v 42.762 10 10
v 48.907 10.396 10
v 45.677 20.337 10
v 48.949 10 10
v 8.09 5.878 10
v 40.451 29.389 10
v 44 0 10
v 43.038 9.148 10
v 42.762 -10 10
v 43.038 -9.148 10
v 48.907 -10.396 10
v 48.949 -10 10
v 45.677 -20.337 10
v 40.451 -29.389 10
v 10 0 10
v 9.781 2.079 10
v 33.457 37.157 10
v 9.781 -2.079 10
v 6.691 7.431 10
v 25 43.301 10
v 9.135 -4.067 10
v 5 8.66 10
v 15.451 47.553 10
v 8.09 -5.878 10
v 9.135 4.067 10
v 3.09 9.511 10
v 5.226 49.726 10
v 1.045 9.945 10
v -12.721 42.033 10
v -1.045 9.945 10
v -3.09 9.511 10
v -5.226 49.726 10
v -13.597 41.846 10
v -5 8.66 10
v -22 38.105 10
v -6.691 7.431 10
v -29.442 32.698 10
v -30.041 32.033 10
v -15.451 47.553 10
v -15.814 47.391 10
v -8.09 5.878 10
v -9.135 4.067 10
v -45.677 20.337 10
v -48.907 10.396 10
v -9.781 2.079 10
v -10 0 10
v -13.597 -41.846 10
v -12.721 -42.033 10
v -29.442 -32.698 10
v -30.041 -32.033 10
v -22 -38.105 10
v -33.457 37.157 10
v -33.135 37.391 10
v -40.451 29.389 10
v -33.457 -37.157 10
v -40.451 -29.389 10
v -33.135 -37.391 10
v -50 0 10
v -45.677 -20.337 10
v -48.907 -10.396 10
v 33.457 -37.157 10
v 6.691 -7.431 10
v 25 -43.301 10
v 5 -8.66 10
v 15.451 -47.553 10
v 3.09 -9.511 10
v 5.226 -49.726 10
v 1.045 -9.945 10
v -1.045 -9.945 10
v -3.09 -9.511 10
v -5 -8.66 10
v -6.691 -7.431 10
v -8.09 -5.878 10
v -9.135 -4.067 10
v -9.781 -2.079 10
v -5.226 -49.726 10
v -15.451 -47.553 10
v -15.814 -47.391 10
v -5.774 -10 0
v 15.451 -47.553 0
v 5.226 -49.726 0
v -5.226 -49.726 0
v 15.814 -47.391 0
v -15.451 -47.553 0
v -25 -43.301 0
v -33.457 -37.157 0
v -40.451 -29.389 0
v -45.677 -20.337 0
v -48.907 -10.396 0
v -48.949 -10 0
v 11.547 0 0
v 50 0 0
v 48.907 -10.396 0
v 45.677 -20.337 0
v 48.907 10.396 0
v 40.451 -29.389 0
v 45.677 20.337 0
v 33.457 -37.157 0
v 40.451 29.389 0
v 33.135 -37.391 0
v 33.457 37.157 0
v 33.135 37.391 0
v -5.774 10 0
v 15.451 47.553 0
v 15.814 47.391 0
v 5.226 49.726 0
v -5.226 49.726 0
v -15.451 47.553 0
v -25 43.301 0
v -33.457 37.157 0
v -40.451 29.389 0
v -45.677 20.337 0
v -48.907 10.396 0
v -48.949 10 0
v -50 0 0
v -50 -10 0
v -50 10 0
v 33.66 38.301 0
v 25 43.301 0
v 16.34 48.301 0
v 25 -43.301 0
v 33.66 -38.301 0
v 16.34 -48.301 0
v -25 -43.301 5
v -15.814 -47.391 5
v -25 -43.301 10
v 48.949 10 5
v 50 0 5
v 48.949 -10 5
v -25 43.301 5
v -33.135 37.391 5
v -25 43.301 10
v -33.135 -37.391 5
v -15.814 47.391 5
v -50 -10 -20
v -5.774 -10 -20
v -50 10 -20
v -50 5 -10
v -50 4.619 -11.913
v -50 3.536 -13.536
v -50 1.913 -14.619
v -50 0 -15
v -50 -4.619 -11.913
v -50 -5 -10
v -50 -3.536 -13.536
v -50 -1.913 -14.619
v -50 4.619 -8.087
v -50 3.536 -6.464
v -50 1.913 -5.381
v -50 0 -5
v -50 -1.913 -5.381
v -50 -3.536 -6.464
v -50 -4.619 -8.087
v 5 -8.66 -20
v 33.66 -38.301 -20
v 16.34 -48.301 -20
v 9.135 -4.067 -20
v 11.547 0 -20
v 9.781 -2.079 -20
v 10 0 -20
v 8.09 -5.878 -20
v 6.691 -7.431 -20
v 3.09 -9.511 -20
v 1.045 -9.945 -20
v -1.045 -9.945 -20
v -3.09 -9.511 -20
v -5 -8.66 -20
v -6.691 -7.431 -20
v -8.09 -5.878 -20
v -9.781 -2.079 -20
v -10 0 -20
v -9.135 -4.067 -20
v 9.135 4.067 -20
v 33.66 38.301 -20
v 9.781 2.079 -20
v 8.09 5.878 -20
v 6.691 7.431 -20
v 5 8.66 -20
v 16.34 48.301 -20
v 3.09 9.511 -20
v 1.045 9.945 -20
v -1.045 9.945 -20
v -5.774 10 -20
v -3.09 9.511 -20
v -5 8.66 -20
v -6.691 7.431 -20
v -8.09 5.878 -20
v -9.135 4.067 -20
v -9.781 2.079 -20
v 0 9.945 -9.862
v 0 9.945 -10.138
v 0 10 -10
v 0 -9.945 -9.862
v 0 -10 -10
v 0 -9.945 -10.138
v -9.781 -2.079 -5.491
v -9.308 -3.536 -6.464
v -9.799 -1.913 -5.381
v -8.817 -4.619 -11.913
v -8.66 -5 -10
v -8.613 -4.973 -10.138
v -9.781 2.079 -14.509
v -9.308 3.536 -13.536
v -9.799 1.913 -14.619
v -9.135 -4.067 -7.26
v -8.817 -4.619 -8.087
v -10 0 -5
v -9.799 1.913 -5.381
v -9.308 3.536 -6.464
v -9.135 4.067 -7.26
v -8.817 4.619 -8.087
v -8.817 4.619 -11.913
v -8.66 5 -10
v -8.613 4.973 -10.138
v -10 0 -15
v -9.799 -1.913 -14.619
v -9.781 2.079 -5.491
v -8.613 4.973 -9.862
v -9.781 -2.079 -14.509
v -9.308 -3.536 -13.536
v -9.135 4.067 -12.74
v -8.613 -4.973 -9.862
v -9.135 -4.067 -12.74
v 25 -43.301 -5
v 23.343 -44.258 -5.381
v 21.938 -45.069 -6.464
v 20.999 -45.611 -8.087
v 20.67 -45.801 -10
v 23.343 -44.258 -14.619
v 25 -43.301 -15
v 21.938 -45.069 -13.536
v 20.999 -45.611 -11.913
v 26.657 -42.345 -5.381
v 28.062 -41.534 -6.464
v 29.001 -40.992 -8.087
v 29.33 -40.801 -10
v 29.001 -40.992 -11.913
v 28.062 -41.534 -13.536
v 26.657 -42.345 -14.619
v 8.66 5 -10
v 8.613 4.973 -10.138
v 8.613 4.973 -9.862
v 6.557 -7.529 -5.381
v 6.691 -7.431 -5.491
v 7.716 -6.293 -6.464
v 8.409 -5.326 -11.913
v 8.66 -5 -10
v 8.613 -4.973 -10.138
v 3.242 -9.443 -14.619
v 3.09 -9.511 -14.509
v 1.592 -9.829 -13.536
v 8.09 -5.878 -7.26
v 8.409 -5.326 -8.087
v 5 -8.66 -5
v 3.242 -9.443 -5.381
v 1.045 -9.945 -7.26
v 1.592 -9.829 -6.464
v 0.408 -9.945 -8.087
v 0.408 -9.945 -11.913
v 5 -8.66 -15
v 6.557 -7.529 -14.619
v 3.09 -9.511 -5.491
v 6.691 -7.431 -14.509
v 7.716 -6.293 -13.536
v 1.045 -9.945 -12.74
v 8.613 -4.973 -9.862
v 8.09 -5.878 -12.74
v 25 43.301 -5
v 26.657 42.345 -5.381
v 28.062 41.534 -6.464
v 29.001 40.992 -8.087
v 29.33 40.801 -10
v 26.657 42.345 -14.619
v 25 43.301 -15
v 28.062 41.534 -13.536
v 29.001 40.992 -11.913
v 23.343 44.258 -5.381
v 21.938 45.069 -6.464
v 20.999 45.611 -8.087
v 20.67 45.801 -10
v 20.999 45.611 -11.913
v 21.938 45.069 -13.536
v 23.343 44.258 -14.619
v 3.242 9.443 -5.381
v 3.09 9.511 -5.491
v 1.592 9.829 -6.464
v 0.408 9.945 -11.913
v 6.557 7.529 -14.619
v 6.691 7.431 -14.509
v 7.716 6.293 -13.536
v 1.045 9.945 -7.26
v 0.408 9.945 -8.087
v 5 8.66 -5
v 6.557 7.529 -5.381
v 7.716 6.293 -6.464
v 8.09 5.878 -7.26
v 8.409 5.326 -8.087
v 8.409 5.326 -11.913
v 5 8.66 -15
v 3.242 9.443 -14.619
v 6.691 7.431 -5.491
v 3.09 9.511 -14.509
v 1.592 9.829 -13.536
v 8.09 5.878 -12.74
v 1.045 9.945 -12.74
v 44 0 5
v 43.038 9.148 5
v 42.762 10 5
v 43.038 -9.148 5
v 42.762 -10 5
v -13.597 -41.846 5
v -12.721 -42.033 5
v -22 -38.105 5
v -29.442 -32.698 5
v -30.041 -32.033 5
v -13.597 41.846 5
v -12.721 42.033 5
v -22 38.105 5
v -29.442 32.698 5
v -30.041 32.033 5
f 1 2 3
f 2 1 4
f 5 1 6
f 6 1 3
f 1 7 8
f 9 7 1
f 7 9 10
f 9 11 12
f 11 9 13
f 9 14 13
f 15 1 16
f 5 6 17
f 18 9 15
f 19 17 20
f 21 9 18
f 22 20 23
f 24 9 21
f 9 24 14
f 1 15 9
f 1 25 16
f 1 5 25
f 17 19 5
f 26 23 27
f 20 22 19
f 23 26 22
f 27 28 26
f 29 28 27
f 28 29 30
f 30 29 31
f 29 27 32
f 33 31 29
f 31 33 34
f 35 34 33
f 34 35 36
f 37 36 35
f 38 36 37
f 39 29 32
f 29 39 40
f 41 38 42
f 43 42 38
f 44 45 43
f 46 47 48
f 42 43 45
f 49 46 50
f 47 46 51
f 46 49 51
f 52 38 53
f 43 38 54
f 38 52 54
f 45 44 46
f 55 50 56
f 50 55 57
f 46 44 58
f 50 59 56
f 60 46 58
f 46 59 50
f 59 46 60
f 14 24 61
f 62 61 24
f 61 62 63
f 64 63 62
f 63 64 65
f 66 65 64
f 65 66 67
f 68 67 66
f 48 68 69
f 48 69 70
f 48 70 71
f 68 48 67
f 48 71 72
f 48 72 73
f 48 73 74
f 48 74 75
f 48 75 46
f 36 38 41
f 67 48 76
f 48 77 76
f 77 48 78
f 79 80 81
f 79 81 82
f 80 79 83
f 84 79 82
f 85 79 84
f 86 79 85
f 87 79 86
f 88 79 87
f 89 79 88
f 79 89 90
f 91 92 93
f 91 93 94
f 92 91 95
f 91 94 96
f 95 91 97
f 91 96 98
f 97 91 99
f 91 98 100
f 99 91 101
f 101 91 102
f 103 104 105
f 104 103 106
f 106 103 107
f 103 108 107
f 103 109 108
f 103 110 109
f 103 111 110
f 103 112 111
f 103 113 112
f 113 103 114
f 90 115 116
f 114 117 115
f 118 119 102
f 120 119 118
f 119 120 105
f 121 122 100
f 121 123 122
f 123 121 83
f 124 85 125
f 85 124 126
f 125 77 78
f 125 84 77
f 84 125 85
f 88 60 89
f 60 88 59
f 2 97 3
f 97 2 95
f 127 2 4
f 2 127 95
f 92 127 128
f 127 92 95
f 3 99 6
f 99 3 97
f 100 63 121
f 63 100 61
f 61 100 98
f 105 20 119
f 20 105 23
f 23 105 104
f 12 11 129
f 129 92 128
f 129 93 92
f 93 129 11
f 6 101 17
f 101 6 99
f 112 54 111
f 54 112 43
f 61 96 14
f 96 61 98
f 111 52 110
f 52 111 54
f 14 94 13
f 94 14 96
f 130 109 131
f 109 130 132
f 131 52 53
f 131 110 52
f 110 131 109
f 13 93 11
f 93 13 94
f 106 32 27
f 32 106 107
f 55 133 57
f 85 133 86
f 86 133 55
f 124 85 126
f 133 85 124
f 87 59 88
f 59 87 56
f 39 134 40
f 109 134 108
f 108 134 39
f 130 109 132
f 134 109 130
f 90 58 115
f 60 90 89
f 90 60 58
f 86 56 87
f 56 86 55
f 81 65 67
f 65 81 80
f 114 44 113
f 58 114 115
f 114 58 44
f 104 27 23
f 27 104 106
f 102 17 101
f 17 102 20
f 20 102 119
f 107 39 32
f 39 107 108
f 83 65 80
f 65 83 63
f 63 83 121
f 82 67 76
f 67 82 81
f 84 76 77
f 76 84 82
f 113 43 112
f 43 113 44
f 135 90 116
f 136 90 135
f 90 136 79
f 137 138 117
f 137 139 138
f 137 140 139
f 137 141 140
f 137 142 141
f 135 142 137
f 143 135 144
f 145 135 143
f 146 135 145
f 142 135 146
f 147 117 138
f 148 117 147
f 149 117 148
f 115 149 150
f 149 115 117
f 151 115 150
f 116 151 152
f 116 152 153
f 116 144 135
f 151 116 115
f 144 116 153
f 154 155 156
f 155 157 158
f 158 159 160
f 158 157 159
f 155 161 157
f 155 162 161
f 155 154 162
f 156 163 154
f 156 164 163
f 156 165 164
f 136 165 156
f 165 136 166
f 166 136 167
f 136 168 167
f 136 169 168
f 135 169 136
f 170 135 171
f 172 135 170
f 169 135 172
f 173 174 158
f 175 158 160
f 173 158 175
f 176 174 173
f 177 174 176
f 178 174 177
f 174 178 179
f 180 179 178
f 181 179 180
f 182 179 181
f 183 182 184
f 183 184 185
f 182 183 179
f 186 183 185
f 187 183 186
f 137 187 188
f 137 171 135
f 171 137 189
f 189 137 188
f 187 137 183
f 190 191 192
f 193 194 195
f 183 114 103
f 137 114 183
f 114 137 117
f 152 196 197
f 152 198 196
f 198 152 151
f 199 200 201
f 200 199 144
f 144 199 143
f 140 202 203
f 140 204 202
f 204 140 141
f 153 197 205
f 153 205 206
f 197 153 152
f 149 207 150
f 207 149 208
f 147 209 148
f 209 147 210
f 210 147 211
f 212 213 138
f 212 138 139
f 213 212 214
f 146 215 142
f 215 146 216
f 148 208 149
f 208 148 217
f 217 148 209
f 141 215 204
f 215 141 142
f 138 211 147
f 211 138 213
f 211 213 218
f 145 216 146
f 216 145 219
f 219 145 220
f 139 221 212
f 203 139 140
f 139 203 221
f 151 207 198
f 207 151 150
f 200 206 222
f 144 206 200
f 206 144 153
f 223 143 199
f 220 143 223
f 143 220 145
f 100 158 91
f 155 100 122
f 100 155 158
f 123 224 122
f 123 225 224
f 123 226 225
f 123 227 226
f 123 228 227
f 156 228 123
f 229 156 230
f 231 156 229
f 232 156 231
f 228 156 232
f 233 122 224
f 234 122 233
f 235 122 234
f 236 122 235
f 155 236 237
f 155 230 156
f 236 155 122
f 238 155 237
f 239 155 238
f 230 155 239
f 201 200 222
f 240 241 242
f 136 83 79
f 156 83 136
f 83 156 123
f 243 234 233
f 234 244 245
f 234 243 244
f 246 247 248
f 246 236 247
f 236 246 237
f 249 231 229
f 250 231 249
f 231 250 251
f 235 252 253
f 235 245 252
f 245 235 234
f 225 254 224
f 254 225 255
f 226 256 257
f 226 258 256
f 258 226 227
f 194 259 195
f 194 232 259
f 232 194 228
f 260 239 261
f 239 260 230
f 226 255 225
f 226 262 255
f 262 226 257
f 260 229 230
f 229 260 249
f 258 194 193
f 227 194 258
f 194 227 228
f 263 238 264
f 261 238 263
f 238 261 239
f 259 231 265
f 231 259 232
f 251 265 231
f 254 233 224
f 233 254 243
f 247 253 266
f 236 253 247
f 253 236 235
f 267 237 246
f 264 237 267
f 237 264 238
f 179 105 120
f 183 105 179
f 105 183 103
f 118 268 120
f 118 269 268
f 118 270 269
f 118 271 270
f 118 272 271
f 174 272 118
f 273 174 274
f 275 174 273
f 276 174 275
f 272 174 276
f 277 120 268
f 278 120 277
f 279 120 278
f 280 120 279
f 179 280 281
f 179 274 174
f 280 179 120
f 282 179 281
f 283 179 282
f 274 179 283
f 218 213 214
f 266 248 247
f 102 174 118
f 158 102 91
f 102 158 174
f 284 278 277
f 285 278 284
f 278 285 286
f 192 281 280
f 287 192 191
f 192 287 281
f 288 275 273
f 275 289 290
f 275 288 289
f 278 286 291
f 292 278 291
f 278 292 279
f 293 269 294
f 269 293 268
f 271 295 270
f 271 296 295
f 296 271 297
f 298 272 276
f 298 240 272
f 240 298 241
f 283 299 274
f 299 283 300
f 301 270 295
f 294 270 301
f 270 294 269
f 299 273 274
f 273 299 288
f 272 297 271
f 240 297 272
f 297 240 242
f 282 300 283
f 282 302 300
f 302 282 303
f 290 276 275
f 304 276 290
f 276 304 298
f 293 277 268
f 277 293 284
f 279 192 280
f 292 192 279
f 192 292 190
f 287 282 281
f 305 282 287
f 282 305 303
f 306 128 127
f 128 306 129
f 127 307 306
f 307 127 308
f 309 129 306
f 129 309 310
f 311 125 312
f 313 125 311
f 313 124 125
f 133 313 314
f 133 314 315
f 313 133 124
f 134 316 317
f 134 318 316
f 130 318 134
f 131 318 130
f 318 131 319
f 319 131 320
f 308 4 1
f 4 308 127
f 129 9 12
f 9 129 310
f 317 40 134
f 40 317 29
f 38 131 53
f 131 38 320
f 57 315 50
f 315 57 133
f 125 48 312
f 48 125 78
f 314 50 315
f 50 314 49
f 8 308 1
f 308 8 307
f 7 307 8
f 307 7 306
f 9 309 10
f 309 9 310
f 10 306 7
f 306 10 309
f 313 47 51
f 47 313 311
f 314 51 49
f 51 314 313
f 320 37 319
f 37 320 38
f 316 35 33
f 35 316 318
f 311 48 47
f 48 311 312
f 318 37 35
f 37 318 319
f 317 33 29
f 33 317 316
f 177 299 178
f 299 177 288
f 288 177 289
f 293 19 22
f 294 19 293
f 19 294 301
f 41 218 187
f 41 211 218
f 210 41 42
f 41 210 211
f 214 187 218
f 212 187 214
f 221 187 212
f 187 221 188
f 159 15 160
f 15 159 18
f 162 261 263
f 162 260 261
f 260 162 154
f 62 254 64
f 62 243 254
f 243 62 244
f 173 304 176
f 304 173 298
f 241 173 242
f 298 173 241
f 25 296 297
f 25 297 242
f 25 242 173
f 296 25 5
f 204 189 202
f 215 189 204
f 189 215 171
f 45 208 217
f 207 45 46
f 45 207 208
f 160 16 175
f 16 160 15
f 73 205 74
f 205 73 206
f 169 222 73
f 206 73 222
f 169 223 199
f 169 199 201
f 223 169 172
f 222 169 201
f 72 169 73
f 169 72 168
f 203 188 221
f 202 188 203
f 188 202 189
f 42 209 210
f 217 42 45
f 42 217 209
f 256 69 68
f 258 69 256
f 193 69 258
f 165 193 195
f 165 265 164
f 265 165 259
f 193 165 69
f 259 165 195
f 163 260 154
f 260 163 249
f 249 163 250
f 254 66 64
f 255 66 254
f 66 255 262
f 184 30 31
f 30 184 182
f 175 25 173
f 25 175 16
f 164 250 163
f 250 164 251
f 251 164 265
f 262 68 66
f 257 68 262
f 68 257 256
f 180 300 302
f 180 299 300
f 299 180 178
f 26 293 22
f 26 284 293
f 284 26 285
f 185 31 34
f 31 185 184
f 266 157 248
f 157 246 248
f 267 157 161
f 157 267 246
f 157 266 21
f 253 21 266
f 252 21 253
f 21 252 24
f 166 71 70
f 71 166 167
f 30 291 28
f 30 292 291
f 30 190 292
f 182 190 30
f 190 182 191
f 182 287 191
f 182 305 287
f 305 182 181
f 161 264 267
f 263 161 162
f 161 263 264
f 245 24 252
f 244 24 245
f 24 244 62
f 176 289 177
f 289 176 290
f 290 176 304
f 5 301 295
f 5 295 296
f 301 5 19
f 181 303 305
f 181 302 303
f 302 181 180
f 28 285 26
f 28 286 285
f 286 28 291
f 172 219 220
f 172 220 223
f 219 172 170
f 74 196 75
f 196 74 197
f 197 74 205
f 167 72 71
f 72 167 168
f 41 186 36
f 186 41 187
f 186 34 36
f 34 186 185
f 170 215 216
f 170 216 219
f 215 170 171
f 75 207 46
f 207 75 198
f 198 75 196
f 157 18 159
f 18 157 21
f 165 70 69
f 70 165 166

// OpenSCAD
// file: bearing.scad
/*
 * DISCLAIMER!
 * THIS IS NOT A PRINTED PART
 * IT IS A PLACEHOLDER FOR A THIRD-PARTY BEARING
 */
include <params.scad>

module bearing() {
  difference() {
    cylinder(h=bearing_height,  r=bearing_or);
    cylinder(h=bearing_height, r=bearing_ir);
  }
}

bearing();
// file: params.scad
// GLOBAL
hole_radius = 5;
peg_radius = 4.5;

// MAGNET
mag_height = 7;
mag_ring_ir = 50.8;
mag_ring_or = 101.6;
mag_count = 16;

// BEARING
bearing_height = 17;
bearing_ir = 33;
bearing_or = 44;

// STATOR
stator_height = 20;
stator_inner_height = 10;
stator_bearing_inset = (stator_height/2) - 1;
stator_count = 6;
stator_incidence = 360/stator_count;
stator_radius = 115;
stator_tab_width = 10;
stator_tab_offset = 50;
stator_wiring_gap = 25;
stator_wiring_gap_inset = stator_radius - (stator_wiring_gap + 10);
stator_outer_tab_extrude = 15;
stator_outer_tab_width = 30;
stator_notch = 15;
stator_notch_width = 5;
coil_edge = 80;

// ROTOR & ROTOR CAP
rotor_height = 10;
rotor_inner_height = 3;
rotor_radius = 105;
rotor_inner_diameter = 25;
rotor_count = 8;
rotor_incidence = 360/rotor_count;
rotor_tie_hole_offset = 30;

rotor_cap_radius = 50;
rotor_cap_peg_radius = 35;
rotor_cap_inner_radius = 10;
rotor_cap_height = 10;
rotor_cap_insert_height = 10;
rotor_cap_bearing_inset = (bearing_height + rotor_inner_height) - rotor_cap_height;
rotor_plate_height = 5;
blade_holder_edge = 20;

// ROTOR EDGE TIE
rotor_edge_tie_length = 40;
rotor_edge_tie_width = 20;
rotor_edge_tie_inner_height = 5;
rotor_edge_tie_height = 15;
rotor_edge_tie_peg_inset = 10;
// main file
include <params.scad>
use <bearing.scad>

module subtractor() {
  difference() {
    for (i = [0:stator_count/2]) {
      rotate([0, 0, i * (360 / (stator_count / 2))]) {
        translate([0, blade_holder_edge / -2, 0]) {
          cube([rotor_cap_radius, blade_holder_edge, rotor_plate_height]);
        }
      }
    }
    cylinder(h=rotor_plate_height, r=bearing_or);
  }
}

module rotor_insert() {
  cylinder(r=rotor_cap_radius, h=rotor_cap_height);
  for (i = [0:rotor_count]) {
    rotate(i * (360 / (rotor_count + 1)), [0, 0, 1])
    translate([0, rotor_cap_peg_radius, 0])
    cylinder(r=peg_radius, h=rotor_cap_insert_height);
  }
}

module blade_holder() {
  translate([0, 0, -blade_holder_edge]) {
    difference() {
      translate([0, blade_holder_edge/-2, 0]) {
        rotate([0, 0, 90]) { cube([blade_holder_edge, rotor_cap_radius, blade_holder_edge]); }
      }
      translate([0, 0, blade_holder_edge/2]) {
        rotate([0, -90, 0]) {
          cylinder(r=hole_radius, h=rotor_cap_radius + 10);
        }
      }
    }
  }
}

module rotor_cap_full() {
  difference() {
    union() {
      rotor_insert();
      for (i = [0:stator_count/2]) {
        rotate([0, 0, i * (360 / (stator_count/2))]) { blade_holder(); }
      }
    }
    translate([0, 0, rotor_cap_height - rotor_plate_height]) {
      subtractor();
    }
  }
}

module rotor_cap() {
  difference() {
    rotor_cap_full();
    translate([0, 0, -50]) { cylinder(h=100, r=rotor_cap_inner_radius); }
  }
}

rotor_cap();
